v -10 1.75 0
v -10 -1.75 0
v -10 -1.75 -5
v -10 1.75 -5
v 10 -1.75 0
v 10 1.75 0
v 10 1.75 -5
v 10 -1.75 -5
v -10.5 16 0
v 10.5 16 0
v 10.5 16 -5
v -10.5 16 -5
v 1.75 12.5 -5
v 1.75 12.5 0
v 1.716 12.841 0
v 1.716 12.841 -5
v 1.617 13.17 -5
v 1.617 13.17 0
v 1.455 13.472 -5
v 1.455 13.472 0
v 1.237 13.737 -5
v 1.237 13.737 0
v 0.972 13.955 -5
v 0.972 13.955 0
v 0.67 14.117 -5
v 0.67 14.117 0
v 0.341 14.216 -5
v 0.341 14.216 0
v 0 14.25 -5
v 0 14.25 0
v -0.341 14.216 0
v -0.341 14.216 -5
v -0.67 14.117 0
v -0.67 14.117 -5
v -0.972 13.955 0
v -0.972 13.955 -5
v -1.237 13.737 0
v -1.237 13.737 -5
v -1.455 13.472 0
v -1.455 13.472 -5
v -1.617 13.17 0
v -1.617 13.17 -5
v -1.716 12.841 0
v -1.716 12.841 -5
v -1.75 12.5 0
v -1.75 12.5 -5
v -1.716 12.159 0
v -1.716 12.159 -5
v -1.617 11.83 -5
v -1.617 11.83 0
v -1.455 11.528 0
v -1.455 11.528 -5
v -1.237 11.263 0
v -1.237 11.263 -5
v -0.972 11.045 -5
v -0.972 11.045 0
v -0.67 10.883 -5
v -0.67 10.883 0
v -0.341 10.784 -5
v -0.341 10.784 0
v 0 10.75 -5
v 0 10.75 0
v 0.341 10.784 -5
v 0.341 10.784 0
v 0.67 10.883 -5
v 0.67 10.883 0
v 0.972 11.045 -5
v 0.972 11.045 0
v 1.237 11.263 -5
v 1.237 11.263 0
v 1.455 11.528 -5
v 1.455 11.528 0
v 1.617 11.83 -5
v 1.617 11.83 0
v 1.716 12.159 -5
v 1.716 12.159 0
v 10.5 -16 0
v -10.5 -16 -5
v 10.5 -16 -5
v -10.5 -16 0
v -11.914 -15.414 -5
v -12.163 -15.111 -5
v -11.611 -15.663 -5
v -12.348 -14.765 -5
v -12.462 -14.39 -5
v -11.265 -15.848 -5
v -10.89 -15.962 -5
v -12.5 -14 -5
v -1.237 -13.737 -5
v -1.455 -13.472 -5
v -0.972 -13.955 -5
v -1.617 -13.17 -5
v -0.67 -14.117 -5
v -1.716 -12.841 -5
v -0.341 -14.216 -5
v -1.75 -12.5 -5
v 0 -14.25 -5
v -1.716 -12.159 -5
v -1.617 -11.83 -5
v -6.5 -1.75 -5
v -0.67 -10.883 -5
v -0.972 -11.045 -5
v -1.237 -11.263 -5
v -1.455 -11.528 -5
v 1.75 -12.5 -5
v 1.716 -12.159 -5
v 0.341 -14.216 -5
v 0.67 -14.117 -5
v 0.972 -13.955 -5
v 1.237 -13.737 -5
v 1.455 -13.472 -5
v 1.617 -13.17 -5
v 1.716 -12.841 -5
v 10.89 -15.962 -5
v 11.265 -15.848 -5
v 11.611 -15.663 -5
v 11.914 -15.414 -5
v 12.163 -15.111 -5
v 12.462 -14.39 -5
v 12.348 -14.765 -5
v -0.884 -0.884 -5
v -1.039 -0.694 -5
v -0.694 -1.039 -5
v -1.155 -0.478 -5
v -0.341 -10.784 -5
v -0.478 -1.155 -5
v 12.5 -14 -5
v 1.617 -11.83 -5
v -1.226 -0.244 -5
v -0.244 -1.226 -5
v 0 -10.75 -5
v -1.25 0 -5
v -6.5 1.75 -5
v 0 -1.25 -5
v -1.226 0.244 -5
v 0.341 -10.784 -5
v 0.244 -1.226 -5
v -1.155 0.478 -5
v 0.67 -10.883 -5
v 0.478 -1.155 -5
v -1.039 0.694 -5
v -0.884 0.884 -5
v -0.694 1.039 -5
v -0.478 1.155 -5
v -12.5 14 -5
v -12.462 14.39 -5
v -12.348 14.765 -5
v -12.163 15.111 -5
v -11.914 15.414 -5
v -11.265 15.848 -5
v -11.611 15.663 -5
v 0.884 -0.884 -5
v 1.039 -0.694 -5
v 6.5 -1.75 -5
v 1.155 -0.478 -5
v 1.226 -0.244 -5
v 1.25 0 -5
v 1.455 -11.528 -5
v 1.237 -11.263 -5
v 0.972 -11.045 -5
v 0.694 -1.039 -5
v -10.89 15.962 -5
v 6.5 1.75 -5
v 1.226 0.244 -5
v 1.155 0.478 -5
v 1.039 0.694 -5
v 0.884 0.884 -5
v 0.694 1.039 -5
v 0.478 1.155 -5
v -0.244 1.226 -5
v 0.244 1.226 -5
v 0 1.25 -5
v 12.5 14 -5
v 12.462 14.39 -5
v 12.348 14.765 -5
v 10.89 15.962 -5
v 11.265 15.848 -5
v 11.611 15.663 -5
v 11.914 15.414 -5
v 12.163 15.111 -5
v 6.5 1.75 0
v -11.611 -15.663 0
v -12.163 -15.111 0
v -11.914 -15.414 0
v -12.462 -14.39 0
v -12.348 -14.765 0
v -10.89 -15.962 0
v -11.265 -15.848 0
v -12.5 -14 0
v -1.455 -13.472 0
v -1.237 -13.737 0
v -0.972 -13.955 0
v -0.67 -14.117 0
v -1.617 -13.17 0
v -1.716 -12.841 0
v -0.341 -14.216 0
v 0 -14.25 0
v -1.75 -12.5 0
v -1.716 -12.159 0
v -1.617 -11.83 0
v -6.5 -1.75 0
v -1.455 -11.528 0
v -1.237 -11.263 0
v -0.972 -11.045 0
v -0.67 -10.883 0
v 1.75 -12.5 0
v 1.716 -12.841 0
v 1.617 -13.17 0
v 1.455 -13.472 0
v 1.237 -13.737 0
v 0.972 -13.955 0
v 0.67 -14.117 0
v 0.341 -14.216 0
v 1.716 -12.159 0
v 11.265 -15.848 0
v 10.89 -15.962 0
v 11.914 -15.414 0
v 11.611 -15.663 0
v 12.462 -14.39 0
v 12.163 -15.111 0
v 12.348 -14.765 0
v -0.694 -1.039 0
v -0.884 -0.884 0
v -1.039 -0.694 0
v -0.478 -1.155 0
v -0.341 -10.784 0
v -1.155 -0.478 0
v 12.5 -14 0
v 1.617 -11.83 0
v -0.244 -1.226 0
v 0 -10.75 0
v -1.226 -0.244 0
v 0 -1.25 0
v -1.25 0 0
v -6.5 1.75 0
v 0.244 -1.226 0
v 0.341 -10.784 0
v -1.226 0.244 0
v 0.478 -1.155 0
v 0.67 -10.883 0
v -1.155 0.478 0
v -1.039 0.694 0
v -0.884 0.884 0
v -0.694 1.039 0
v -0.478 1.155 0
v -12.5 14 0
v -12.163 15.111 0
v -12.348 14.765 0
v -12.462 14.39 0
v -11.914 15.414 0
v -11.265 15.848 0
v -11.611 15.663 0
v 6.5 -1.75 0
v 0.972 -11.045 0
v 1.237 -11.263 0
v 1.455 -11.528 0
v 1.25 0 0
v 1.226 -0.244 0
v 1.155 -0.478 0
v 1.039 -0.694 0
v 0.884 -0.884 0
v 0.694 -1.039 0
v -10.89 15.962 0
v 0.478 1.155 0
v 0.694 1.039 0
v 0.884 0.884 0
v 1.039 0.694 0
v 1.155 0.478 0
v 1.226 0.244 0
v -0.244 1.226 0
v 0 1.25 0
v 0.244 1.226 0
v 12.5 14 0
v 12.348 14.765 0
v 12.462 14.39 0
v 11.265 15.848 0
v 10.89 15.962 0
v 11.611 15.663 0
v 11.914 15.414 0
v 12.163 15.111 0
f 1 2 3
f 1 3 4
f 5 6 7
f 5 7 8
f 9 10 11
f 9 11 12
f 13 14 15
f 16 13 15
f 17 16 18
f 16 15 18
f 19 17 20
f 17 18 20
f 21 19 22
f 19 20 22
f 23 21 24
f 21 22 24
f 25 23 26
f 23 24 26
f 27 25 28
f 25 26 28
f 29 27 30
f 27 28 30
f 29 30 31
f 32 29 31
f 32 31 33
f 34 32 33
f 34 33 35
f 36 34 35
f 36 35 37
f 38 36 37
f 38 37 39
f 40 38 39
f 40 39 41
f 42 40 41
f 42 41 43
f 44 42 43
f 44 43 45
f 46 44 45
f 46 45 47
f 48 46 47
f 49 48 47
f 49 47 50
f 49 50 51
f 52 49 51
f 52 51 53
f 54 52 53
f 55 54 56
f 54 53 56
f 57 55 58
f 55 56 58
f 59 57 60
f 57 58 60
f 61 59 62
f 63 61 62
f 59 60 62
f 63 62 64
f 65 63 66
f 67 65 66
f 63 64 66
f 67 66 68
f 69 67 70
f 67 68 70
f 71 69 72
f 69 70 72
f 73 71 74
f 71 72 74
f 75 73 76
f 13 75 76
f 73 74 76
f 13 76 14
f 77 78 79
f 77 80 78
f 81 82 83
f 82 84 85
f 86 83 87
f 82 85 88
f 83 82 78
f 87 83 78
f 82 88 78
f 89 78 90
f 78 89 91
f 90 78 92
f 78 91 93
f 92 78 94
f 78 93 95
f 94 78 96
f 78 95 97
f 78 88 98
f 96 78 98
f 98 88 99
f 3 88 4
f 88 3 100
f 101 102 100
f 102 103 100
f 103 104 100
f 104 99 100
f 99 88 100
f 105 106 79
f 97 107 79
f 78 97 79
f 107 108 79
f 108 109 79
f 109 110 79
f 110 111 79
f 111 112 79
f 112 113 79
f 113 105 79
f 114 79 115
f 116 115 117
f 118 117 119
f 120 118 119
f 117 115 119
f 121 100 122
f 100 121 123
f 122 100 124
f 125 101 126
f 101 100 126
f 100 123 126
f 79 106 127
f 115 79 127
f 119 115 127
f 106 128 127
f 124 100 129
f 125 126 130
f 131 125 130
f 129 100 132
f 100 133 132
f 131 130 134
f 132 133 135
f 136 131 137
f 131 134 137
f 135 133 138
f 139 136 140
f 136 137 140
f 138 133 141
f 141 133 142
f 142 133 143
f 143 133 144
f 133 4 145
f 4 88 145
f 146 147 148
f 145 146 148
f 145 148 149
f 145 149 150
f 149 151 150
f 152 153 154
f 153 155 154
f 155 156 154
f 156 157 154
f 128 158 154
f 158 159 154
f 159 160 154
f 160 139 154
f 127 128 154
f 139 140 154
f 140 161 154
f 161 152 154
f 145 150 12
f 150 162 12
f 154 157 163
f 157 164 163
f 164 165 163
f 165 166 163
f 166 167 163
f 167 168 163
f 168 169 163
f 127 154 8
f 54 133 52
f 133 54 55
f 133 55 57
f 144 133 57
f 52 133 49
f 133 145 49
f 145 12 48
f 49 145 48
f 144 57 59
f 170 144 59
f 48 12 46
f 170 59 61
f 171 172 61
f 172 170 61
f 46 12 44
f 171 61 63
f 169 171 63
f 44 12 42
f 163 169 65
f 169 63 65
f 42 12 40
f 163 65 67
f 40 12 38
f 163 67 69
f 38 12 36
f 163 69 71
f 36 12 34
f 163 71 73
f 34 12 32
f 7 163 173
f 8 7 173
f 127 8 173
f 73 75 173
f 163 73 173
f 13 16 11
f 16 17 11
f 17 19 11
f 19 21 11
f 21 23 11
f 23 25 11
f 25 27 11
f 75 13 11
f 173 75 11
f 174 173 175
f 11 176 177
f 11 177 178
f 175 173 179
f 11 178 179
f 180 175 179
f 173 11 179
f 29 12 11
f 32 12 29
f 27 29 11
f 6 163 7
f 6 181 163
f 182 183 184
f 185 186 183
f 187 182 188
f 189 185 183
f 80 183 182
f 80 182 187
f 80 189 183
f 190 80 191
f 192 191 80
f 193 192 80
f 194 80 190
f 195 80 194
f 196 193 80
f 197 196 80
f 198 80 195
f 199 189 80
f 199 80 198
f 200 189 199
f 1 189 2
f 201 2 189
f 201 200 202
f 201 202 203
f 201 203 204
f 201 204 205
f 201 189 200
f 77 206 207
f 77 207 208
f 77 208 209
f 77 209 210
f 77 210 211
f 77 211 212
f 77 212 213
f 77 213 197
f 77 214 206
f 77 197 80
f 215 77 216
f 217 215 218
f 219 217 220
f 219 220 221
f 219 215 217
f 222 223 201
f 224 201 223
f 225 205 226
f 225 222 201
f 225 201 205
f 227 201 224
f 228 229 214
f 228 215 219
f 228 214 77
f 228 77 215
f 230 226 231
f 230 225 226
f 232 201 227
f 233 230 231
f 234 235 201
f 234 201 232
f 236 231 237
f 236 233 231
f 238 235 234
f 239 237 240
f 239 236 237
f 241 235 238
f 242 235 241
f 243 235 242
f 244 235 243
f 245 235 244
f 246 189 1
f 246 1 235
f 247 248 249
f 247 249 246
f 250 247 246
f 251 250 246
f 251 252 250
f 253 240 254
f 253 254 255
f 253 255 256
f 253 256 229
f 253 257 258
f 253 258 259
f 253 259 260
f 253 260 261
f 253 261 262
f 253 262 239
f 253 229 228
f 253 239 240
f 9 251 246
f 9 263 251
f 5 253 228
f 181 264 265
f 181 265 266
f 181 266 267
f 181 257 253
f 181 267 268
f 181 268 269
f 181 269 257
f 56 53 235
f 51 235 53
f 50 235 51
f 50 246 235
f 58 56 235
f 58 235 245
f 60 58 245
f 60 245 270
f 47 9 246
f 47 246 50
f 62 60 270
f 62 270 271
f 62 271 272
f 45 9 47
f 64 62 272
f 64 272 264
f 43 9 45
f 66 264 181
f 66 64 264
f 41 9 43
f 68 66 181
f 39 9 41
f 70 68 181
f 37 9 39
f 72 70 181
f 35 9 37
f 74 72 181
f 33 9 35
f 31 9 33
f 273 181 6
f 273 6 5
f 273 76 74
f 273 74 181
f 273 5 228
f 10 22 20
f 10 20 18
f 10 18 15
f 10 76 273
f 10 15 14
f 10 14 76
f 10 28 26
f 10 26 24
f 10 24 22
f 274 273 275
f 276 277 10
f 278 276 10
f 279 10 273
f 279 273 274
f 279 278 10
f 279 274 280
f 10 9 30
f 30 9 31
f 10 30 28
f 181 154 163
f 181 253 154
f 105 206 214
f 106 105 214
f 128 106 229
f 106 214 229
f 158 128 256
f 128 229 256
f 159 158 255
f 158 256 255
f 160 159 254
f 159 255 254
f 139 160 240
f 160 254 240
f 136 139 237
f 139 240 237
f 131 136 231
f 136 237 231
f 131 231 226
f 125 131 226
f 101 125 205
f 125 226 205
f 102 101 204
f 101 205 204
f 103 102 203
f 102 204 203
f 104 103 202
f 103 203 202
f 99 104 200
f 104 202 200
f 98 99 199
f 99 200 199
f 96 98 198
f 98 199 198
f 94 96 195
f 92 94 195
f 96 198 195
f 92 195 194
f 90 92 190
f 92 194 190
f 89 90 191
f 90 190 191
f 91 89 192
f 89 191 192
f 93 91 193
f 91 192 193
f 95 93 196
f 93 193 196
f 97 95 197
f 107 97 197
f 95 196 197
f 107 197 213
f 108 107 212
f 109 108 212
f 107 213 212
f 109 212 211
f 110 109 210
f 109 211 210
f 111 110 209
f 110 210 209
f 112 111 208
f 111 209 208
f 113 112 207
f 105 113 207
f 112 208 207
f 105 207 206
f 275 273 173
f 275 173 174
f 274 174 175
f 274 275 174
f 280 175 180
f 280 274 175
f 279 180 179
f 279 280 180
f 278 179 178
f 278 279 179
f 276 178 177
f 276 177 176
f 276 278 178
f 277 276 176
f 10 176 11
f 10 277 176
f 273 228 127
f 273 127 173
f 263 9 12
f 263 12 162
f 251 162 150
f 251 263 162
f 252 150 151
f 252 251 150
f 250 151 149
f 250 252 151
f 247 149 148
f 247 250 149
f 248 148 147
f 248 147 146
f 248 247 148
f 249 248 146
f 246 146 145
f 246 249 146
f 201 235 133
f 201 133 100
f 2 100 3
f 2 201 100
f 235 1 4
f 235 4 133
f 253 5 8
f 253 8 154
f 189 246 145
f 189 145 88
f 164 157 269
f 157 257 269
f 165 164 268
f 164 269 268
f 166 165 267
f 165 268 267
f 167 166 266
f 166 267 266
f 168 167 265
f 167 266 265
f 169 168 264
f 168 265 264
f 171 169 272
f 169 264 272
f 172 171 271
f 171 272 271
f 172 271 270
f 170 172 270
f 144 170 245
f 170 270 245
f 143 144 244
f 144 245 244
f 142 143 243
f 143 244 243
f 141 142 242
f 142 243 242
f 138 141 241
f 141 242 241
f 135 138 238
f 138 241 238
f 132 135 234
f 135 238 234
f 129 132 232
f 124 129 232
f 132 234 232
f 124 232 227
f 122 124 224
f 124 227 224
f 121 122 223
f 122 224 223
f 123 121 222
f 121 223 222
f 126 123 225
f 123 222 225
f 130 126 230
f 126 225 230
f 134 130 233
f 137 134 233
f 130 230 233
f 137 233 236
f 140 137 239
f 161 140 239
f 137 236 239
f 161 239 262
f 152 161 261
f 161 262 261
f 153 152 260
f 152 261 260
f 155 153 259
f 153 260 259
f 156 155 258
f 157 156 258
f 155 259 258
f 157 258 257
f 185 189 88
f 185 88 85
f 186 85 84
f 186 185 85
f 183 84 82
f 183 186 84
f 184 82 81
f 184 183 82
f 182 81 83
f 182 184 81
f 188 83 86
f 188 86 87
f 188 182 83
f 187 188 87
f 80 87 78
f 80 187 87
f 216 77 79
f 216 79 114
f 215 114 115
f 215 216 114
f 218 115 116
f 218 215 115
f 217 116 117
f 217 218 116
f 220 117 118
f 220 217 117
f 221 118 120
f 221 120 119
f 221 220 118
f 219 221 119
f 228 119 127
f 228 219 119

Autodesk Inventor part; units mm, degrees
ref_plane "YZ Plane" through (0, 0, 0) normal (1, 0, 0) x (0, 1, 0)
ref_plane "XZ Plane" through (0, 0, 0) normal (0, 1, 0) x (-1, 0, 0)
ref_plane "XY Plane" through (0, 0, 0) normal (0, 0, 1) x (1, 0, 0)
sketch "Skizze1" plane through (0, 0, 0) normal (0, 0, 1) x (1, 0, 0)
  line L0 (-18.0799, 0) -> (18.0799, 0) projected
  line L1 (0, -22.9799) -> (0, 22.9799) projected
  line L2 (-10.5, -16) -> (10.5, -16)
  line L3 (12.5, -14) -> (12.5, 14)
  line L4 (10.5, 16) -> (-10.5, 16)
  line L5 (-12.5, 14) -> (-12.5, -14)
  line L6 (-12.5, -16) -> (12.5, 16) construction
  line L7 (12.5, -16) -> (-12.5, 16) construction
  arc A0 (-10.5, 16) -> (-12.5, 14) centre (-10.5, 14) ccw
  arc A1 (-12.5, -14) -> (-10.5, -16) centre (-10.5, -14) ccw
  arc A2 (10.5, -16) -> (12.5, -14) centre (10.5, -14) ccw
  arc A3 (12.5, 14) -> (10.5, 16) centre (10.5, 14) ccw
  point P0 (0, 0)
  dimension "d0" = 25
  dimension "d1" = 32
  dimension "d2" = 2
extrude "Extrusion1" add sketch "Skizze1" against normal blind 5
sketch "Skizze2" plane through (0, 0, 0) normal (0, 0, 1) x (1, 0, 0)
  line L0 (12.5, -14) -> (12.5, 14) projected
  arc A0 (12.5, 14) -> (10.5, 16) centre (10.5, 14) ccw projected
  line L1 (10.5, 16) -> (-10.5, 16) projected
  arc A1 (-10.5, 16) -> (-12.5, 14) centre (-10.5, 14) ccw projected
  line L2 (-12.5, 14) -> (-12.5, -14) projected
  arc A2 (-12.5, -14) -> (-10.5, -16) centre (-10.5, -14) ccw projected
  line L3 (-10.5, -16) -> (10.5, -16) projected
  arc A3 (10.5, -16) -> (12.5, -14) centre (10.5, -14) ccw projected
  line L4 (-18.0799, 0) -> (18.0799, 0) projected
  line L5 (0, -22.9799) -> (0, 22.9799) projected
  circle A4 centre (0, 12.5) radius 1.75
  circle A5 centre (0, -12.5) radius 1.75
  point P0 (0, 0)
  dimension "d5" = 3.5
  dimension "d6" = 3.5
  dimension "d7" = 25
  dimension "d8" = 3.5
extrude "Extrusion2" cut sketch "Skizze2" against normal blind 5 contours A5 L5 | L5 A5 | A4 L5 | L5 A4
sketch "Skizze3" plane through (0, 0, 0) normal (0, 0, 1) x (1, 0, 0)
  circle A0 centre (0, -12.5) radius 1.75 projected
  circle A1 centre (0, 12.5) radius 1.75 projected
  line L0 (12.5, -14) -> (12.5, 14) projected
  arc A2 (12.5, 14) -> (10.5, 16) centre (10.5, 14) ccw projected
  line L1 (10.5, 16) -> (-10.5, 16) projected
  arc A3 (-10.5, 16) -> (-12.5, 14) centre (-10.5, 14) ccw projected
  line L2 (-12.5, 14) -> (-12.5, -14) projected
  arc A4 (-12.5, -14) -> (-10.5, -16) centre (-10.5, -14) ccw projected
  line L3 (-10.5, -16) -> (10.5, -16) projected
  arc A5 (10.5, -16) -> (12.5, -14) centre (10.5, -14) ccw projected
  line L4 (-18.0799, 0) -> (18.0799, 0) projected
  line L5 (0, -22.9799) -> (0, 22.9799) projected
  line L6 (-10, 1.75) -> (-6.5, 1.75)
  line L7 (-6.5, 1.75) -> (-6.5, -1.75)
  line L8 (-6.5, -1.75) -> (-10, -1.75)
  line L9 (-10, -1.75) -> (-10, 1.75)
  line L10 (6.5, 1.75) -> (10, 1.75)
  line L11 (10, 1.75) -> (10, -1.75)
  line L12 (10, -1.75) -> (6.5, -1.75)
  line L13 (6.5, -1.75) -> (6.5, 1.75)
  point P0 (0, 0)
  dimension "d11" = 3.5
  dimension "d12" = 3.5
  dimension "d13" = 3.5
  dimension "d14" = 3.5
  dimension "d15" = 13
extrude "Extrusion3" cut sketch "Skizze3" against normal blind 5 contours L7 L8 L9 L4 | L4 L9 L6 L7 | L13 L10 L11 L4 | L4 L11 L12 L13
sketch "Skizze4" plane through (0, 0, 0) normal (0, 0, 1) x (1, 0, 0)
  line L0 (6.5, 1.75) -> (10, 1.75) projected
  line L1 (10, 1.75) -> (10, -1.75) projected
  line L2 (10, -1.75) -> (6.5, -1.75) projected
  line L3 (6.5, -1.75) -> (6.5, 1.75) projected
  line L4 (-10, 1.75) -> (-6.5, 1.75) projected
  line L5 (-6.5, 1.75) -> (-6.5, -1.75) projected
  line L6 (-6.5, -1.75) -> (-10, -1.75) projected
  line L7 (-10, -1.75) -> (-10, 1.75) projected
  circle A0 centre (0, -12.5) radius 1.75 projected
  circle A1 centre (0, 12.5) radius 1.75 projected
  line L8 (12.5, -14) -> (12.5, 14) projected
  arc A2 (12.5, 14) -> (10.5, 16) centre (10.5, 14) ccw projected
  line L9 (10.5, 16) -> (-10.5, 16) projected
  arc A3 (-10.5, 16) -> (-12.5, 14) centre (-10.5, 14) ccw projected
  line L10 (-12.5, 14) -> (-12.5, -14) projected
  arc A4 (-12.5, -14) -> (-10.5, -16) centre (-10.5, -14) ccw projected
  line L11 (-10.5, -16) -> (10.5, -16) projected
  arc A5 (10.5, -16) -> (12.5, -14) centre (10.5, -14) ccw projected
  line L12 (-18.0799, 0) -> (18.0799, 0) projected
  line L13 (0, -22.9799) -> (0, 22.9799) projected
  circle A6 centre (0, 0) radius 1.25
  dimension "d18" = 2.5
extrude "Extrusion4" cut sketch "Skizze4" against normal blind 5 contours A6 L13 L12 | L12 L13 A6 | L13 A6 L12 | L12 A6 L13
properties part number "I Rückwand Adapter" material "PBT-Kunststoff"
